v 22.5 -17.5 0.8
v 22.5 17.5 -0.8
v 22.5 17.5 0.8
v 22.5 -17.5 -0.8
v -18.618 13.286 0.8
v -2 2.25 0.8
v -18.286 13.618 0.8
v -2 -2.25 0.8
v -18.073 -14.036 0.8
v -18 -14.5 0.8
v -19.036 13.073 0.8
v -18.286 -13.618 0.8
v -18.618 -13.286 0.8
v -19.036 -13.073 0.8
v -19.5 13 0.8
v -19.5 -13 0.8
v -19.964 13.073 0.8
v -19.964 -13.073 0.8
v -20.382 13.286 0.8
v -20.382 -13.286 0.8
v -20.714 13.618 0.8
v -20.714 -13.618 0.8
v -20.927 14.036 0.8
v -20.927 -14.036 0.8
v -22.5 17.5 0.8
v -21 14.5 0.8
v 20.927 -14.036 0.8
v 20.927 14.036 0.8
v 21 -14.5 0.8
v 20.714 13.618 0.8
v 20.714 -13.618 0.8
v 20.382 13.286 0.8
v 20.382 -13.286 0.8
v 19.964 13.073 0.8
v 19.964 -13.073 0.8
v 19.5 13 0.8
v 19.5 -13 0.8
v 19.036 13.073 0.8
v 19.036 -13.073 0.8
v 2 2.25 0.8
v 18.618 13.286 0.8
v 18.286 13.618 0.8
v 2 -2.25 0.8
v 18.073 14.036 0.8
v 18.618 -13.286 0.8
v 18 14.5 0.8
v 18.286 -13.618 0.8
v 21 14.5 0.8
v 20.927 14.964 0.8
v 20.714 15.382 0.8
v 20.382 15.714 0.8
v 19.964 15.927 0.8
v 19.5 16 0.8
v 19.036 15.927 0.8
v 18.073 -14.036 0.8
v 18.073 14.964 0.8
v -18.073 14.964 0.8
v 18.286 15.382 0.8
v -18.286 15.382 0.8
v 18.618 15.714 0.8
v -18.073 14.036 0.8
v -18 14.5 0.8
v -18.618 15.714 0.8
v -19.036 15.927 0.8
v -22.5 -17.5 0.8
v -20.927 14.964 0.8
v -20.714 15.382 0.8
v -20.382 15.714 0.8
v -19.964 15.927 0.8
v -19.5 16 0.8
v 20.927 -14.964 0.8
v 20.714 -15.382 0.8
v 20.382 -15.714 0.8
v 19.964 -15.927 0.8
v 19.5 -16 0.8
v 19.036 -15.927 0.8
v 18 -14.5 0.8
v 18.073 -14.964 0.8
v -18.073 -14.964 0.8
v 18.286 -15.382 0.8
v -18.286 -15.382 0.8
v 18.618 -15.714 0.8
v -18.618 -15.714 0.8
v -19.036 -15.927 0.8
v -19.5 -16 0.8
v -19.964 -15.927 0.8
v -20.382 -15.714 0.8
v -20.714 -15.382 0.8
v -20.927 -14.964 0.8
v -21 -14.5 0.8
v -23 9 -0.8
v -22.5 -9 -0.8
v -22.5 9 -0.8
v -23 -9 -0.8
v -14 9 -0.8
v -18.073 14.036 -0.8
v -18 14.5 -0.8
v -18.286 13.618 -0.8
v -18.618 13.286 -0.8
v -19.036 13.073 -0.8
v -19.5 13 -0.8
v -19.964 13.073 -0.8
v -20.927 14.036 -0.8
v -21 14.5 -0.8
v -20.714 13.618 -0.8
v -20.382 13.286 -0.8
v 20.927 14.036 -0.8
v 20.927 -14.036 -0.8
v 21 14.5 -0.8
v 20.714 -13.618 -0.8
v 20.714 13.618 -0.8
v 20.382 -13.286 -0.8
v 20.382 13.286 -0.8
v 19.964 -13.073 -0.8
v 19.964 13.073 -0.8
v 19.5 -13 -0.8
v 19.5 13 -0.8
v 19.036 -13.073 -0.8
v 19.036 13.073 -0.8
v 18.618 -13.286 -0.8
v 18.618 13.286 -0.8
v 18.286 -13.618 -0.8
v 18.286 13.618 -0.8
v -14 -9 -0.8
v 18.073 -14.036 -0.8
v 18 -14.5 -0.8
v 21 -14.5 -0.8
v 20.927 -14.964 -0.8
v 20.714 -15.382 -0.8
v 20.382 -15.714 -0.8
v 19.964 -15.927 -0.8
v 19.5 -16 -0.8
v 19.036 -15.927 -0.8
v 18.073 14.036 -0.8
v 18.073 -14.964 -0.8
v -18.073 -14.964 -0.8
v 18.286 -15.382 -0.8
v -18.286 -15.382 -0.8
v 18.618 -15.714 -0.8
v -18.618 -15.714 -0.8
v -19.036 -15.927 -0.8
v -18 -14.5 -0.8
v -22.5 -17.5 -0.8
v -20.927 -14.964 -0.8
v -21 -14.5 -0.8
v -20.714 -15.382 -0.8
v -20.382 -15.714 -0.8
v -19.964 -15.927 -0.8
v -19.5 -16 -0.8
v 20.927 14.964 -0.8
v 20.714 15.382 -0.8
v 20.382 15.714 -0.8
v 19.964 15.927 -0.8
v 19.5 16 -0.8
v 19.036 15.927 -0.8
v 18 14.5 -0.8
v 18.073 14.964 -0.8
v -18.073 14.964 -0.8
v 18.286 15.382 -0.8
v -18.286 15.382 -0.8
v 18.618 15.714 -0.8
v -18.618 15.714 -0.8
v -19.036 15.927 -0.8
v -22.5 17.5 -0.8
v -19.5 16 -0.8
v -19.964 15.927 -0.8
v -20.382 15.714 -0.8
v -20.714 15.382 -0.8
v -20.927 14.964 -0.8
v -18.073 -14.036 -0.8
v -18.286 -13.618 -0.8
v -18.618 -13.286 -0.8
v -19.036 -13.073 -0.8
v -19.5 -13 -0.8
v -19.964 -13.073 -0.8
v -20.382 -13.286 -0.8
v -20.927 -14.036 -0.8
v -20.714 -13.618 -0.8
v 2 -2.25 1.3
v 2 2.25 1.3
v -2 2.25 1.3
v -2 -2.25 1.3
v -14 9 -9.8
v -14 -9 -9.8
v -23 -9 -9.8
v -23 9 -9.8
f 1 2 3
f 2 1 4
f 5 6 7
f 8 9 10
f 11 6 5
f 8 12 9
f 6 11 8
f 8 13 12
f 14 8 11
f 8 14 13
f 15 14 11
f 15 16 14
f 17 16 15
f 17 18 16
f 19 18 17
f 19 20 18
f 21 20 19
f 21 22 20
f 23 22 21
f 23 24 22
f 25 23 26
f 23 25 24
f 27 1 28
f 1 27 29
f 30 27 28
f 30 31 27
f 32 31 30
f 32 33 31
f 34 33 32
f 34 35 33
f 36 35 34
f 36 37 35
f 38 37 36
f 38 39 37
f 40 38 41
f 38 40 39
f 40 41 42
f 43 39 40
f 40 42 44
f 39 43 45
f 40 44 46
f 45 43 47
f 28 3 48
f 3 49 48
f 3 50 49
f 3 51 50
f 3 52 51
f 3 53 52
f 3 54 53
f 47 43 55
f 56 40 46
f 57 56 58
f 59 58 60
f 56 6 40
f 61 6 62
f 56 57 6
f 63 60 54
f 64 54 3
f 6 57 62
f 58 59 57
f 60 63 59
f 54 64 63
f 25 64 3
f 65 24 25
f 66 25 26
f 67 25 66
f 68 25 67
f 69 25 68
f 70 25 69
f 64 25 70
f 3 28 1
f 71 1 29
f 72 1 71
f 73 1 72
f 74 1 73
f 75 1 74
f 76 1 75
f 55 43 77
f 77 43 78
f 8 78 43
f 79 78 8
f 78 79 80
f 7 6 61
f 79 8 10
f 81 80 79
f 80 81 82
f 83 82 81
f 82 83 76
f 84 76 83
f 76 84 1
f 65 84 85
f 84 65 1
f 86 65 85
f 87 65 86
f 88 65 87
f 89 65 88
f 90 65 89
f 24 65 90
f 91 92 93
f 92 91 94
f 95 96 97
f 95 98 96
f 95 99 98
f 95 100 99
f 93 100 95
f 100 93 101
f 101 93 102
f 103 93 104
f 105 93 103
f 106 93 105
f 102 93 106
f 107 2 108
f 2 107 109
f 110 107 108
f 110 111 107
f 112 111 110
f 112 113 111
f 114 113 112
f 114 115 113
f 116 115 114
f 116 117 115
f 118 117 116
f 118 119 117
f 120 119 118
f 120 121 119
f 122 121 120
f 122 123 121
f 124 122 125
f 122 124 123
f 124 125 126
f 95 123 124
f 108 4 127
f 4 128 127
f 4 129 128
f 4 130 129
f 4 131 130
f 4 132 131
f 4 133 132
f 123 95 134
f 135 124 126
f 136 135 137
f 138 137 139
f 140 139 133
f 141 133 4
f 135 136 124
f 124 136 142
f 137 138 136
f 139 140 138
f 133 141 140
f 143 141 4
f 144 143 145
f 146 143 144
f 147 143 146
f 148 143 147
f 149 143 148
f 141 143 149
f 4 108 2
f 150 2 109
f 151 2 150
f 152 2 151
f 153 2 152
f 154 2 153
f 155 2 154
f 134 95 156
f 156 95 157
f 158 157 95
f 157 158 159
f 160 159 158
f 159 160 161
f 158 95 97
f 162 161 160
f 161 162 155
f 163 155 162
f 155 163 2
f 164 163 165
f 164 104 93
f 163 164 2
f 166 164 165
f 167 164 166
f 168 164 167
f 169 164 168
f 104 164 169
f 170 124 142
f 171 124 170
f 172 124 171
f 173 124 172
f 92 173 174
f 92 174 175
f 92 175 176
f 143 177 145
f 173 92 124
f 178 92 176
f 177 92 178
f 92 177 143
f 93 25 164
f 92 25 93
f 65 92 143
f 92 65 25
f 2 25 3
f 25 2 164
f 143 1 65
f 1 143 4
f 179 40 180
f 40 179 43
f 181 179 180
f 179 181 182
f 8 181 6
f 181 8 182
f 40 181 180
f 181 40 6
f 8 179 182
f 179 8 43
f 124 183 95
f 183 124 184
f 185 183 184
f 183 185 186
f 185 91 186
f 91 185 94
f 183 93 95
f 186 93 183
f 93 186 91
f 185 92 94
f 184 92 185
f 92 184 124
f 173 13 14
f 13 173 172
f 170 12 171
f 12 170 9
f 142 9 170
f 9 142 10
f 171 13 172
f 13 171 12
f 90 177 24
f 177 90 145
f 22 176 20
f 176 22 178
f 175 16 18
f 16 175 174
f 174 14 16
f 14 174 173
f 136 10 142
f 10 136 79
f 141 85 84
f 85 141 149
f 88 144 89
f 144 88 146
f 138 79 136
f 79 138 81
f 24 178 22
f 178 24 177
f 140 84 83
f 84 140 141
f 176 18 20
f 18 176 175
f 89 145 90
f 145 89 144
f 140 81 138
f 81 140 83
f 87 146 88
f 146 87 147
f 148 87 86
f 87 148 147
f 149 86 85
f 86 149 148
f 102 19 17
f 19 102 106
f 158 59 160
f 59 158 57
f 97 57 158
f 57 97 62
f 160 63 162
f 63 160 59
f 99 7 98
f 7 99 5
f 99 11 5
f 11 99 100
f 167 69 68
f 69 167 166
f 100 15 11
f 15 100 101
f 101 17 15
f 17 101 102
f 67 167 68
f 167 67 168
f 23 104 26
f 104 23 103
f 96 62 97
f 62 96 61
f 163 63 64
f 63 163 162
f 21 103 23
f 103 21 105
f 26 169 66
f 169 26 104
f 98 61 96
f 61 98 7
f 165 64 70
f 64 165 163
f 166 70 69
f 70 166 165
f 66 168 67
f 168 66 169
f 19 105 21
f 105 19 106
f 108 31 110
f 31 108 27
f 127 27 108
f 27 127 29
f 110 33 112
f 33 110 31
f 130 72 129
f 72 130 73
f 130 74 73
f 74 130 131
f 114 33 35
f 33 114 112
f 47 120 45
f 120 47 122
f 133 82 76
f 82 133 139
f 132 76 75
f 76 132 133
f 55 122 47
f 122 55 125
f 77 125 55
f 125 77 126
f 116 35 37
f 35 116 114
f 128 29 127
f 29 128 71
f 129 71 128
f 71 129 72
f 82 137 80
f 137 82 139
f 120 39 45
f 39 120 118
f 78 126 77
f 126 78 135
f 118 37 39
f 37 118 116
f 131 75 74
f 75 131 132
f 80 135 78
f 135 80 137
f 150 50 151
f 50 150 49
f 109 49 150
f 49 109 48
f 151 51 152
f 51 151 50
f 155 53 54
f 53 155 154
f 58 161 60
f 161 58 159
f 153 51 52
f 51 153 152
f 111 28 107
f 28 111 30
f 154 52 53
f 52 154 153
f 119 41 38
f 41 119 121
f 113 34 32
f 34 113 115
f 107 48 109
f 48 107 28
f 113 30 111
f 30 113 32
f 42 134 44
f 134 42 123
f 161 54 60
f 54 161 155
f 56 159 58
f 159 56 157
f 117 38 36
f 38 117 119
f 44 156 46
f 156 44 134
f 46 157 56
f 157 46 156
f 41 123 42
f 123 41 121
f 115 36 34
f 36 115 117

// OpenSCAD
/**
 * @name AS5048 carrier board - v1.0
 * from: https://github.com/ZoetropeImaging/as5048A-breakout-board
 * @id as5080-board;
 * @category Misc
 */
module as5048_carrier() {
	difference(){
		union(){
			cube([45,35,1.6], center=true);
			//as5048
			translate([0,0,1.6/2]) color("grey") cube([4,4.5,1], center=true);
			//connector
			translate([9/2-45/2-0.5,0,-9/2-1.6/2]) color("grey") cube([9,18,9], center=true);
		}
		as5048_carrier_holes();
	}
}

/* Helper: Holes for AS5048 board */
module as5048_carrier_holes(){
	as5048_carrier_hole_positions() cylinder(h=1.8, r=1.5, center=true, $fn=20);
}

/* Helper: Hole posisitions for as5048 board*/
module as5048_carrier_hole_positions(){
	x_spacing = 39;
	y_spacing = 29;
	for(x = [-x_spacing/2, x_spacing/2])
		for(y = [-y_spacing/2, y_spacing/2])
			translate([x,y,0])
				children(0);
}

as5048_carrier();
